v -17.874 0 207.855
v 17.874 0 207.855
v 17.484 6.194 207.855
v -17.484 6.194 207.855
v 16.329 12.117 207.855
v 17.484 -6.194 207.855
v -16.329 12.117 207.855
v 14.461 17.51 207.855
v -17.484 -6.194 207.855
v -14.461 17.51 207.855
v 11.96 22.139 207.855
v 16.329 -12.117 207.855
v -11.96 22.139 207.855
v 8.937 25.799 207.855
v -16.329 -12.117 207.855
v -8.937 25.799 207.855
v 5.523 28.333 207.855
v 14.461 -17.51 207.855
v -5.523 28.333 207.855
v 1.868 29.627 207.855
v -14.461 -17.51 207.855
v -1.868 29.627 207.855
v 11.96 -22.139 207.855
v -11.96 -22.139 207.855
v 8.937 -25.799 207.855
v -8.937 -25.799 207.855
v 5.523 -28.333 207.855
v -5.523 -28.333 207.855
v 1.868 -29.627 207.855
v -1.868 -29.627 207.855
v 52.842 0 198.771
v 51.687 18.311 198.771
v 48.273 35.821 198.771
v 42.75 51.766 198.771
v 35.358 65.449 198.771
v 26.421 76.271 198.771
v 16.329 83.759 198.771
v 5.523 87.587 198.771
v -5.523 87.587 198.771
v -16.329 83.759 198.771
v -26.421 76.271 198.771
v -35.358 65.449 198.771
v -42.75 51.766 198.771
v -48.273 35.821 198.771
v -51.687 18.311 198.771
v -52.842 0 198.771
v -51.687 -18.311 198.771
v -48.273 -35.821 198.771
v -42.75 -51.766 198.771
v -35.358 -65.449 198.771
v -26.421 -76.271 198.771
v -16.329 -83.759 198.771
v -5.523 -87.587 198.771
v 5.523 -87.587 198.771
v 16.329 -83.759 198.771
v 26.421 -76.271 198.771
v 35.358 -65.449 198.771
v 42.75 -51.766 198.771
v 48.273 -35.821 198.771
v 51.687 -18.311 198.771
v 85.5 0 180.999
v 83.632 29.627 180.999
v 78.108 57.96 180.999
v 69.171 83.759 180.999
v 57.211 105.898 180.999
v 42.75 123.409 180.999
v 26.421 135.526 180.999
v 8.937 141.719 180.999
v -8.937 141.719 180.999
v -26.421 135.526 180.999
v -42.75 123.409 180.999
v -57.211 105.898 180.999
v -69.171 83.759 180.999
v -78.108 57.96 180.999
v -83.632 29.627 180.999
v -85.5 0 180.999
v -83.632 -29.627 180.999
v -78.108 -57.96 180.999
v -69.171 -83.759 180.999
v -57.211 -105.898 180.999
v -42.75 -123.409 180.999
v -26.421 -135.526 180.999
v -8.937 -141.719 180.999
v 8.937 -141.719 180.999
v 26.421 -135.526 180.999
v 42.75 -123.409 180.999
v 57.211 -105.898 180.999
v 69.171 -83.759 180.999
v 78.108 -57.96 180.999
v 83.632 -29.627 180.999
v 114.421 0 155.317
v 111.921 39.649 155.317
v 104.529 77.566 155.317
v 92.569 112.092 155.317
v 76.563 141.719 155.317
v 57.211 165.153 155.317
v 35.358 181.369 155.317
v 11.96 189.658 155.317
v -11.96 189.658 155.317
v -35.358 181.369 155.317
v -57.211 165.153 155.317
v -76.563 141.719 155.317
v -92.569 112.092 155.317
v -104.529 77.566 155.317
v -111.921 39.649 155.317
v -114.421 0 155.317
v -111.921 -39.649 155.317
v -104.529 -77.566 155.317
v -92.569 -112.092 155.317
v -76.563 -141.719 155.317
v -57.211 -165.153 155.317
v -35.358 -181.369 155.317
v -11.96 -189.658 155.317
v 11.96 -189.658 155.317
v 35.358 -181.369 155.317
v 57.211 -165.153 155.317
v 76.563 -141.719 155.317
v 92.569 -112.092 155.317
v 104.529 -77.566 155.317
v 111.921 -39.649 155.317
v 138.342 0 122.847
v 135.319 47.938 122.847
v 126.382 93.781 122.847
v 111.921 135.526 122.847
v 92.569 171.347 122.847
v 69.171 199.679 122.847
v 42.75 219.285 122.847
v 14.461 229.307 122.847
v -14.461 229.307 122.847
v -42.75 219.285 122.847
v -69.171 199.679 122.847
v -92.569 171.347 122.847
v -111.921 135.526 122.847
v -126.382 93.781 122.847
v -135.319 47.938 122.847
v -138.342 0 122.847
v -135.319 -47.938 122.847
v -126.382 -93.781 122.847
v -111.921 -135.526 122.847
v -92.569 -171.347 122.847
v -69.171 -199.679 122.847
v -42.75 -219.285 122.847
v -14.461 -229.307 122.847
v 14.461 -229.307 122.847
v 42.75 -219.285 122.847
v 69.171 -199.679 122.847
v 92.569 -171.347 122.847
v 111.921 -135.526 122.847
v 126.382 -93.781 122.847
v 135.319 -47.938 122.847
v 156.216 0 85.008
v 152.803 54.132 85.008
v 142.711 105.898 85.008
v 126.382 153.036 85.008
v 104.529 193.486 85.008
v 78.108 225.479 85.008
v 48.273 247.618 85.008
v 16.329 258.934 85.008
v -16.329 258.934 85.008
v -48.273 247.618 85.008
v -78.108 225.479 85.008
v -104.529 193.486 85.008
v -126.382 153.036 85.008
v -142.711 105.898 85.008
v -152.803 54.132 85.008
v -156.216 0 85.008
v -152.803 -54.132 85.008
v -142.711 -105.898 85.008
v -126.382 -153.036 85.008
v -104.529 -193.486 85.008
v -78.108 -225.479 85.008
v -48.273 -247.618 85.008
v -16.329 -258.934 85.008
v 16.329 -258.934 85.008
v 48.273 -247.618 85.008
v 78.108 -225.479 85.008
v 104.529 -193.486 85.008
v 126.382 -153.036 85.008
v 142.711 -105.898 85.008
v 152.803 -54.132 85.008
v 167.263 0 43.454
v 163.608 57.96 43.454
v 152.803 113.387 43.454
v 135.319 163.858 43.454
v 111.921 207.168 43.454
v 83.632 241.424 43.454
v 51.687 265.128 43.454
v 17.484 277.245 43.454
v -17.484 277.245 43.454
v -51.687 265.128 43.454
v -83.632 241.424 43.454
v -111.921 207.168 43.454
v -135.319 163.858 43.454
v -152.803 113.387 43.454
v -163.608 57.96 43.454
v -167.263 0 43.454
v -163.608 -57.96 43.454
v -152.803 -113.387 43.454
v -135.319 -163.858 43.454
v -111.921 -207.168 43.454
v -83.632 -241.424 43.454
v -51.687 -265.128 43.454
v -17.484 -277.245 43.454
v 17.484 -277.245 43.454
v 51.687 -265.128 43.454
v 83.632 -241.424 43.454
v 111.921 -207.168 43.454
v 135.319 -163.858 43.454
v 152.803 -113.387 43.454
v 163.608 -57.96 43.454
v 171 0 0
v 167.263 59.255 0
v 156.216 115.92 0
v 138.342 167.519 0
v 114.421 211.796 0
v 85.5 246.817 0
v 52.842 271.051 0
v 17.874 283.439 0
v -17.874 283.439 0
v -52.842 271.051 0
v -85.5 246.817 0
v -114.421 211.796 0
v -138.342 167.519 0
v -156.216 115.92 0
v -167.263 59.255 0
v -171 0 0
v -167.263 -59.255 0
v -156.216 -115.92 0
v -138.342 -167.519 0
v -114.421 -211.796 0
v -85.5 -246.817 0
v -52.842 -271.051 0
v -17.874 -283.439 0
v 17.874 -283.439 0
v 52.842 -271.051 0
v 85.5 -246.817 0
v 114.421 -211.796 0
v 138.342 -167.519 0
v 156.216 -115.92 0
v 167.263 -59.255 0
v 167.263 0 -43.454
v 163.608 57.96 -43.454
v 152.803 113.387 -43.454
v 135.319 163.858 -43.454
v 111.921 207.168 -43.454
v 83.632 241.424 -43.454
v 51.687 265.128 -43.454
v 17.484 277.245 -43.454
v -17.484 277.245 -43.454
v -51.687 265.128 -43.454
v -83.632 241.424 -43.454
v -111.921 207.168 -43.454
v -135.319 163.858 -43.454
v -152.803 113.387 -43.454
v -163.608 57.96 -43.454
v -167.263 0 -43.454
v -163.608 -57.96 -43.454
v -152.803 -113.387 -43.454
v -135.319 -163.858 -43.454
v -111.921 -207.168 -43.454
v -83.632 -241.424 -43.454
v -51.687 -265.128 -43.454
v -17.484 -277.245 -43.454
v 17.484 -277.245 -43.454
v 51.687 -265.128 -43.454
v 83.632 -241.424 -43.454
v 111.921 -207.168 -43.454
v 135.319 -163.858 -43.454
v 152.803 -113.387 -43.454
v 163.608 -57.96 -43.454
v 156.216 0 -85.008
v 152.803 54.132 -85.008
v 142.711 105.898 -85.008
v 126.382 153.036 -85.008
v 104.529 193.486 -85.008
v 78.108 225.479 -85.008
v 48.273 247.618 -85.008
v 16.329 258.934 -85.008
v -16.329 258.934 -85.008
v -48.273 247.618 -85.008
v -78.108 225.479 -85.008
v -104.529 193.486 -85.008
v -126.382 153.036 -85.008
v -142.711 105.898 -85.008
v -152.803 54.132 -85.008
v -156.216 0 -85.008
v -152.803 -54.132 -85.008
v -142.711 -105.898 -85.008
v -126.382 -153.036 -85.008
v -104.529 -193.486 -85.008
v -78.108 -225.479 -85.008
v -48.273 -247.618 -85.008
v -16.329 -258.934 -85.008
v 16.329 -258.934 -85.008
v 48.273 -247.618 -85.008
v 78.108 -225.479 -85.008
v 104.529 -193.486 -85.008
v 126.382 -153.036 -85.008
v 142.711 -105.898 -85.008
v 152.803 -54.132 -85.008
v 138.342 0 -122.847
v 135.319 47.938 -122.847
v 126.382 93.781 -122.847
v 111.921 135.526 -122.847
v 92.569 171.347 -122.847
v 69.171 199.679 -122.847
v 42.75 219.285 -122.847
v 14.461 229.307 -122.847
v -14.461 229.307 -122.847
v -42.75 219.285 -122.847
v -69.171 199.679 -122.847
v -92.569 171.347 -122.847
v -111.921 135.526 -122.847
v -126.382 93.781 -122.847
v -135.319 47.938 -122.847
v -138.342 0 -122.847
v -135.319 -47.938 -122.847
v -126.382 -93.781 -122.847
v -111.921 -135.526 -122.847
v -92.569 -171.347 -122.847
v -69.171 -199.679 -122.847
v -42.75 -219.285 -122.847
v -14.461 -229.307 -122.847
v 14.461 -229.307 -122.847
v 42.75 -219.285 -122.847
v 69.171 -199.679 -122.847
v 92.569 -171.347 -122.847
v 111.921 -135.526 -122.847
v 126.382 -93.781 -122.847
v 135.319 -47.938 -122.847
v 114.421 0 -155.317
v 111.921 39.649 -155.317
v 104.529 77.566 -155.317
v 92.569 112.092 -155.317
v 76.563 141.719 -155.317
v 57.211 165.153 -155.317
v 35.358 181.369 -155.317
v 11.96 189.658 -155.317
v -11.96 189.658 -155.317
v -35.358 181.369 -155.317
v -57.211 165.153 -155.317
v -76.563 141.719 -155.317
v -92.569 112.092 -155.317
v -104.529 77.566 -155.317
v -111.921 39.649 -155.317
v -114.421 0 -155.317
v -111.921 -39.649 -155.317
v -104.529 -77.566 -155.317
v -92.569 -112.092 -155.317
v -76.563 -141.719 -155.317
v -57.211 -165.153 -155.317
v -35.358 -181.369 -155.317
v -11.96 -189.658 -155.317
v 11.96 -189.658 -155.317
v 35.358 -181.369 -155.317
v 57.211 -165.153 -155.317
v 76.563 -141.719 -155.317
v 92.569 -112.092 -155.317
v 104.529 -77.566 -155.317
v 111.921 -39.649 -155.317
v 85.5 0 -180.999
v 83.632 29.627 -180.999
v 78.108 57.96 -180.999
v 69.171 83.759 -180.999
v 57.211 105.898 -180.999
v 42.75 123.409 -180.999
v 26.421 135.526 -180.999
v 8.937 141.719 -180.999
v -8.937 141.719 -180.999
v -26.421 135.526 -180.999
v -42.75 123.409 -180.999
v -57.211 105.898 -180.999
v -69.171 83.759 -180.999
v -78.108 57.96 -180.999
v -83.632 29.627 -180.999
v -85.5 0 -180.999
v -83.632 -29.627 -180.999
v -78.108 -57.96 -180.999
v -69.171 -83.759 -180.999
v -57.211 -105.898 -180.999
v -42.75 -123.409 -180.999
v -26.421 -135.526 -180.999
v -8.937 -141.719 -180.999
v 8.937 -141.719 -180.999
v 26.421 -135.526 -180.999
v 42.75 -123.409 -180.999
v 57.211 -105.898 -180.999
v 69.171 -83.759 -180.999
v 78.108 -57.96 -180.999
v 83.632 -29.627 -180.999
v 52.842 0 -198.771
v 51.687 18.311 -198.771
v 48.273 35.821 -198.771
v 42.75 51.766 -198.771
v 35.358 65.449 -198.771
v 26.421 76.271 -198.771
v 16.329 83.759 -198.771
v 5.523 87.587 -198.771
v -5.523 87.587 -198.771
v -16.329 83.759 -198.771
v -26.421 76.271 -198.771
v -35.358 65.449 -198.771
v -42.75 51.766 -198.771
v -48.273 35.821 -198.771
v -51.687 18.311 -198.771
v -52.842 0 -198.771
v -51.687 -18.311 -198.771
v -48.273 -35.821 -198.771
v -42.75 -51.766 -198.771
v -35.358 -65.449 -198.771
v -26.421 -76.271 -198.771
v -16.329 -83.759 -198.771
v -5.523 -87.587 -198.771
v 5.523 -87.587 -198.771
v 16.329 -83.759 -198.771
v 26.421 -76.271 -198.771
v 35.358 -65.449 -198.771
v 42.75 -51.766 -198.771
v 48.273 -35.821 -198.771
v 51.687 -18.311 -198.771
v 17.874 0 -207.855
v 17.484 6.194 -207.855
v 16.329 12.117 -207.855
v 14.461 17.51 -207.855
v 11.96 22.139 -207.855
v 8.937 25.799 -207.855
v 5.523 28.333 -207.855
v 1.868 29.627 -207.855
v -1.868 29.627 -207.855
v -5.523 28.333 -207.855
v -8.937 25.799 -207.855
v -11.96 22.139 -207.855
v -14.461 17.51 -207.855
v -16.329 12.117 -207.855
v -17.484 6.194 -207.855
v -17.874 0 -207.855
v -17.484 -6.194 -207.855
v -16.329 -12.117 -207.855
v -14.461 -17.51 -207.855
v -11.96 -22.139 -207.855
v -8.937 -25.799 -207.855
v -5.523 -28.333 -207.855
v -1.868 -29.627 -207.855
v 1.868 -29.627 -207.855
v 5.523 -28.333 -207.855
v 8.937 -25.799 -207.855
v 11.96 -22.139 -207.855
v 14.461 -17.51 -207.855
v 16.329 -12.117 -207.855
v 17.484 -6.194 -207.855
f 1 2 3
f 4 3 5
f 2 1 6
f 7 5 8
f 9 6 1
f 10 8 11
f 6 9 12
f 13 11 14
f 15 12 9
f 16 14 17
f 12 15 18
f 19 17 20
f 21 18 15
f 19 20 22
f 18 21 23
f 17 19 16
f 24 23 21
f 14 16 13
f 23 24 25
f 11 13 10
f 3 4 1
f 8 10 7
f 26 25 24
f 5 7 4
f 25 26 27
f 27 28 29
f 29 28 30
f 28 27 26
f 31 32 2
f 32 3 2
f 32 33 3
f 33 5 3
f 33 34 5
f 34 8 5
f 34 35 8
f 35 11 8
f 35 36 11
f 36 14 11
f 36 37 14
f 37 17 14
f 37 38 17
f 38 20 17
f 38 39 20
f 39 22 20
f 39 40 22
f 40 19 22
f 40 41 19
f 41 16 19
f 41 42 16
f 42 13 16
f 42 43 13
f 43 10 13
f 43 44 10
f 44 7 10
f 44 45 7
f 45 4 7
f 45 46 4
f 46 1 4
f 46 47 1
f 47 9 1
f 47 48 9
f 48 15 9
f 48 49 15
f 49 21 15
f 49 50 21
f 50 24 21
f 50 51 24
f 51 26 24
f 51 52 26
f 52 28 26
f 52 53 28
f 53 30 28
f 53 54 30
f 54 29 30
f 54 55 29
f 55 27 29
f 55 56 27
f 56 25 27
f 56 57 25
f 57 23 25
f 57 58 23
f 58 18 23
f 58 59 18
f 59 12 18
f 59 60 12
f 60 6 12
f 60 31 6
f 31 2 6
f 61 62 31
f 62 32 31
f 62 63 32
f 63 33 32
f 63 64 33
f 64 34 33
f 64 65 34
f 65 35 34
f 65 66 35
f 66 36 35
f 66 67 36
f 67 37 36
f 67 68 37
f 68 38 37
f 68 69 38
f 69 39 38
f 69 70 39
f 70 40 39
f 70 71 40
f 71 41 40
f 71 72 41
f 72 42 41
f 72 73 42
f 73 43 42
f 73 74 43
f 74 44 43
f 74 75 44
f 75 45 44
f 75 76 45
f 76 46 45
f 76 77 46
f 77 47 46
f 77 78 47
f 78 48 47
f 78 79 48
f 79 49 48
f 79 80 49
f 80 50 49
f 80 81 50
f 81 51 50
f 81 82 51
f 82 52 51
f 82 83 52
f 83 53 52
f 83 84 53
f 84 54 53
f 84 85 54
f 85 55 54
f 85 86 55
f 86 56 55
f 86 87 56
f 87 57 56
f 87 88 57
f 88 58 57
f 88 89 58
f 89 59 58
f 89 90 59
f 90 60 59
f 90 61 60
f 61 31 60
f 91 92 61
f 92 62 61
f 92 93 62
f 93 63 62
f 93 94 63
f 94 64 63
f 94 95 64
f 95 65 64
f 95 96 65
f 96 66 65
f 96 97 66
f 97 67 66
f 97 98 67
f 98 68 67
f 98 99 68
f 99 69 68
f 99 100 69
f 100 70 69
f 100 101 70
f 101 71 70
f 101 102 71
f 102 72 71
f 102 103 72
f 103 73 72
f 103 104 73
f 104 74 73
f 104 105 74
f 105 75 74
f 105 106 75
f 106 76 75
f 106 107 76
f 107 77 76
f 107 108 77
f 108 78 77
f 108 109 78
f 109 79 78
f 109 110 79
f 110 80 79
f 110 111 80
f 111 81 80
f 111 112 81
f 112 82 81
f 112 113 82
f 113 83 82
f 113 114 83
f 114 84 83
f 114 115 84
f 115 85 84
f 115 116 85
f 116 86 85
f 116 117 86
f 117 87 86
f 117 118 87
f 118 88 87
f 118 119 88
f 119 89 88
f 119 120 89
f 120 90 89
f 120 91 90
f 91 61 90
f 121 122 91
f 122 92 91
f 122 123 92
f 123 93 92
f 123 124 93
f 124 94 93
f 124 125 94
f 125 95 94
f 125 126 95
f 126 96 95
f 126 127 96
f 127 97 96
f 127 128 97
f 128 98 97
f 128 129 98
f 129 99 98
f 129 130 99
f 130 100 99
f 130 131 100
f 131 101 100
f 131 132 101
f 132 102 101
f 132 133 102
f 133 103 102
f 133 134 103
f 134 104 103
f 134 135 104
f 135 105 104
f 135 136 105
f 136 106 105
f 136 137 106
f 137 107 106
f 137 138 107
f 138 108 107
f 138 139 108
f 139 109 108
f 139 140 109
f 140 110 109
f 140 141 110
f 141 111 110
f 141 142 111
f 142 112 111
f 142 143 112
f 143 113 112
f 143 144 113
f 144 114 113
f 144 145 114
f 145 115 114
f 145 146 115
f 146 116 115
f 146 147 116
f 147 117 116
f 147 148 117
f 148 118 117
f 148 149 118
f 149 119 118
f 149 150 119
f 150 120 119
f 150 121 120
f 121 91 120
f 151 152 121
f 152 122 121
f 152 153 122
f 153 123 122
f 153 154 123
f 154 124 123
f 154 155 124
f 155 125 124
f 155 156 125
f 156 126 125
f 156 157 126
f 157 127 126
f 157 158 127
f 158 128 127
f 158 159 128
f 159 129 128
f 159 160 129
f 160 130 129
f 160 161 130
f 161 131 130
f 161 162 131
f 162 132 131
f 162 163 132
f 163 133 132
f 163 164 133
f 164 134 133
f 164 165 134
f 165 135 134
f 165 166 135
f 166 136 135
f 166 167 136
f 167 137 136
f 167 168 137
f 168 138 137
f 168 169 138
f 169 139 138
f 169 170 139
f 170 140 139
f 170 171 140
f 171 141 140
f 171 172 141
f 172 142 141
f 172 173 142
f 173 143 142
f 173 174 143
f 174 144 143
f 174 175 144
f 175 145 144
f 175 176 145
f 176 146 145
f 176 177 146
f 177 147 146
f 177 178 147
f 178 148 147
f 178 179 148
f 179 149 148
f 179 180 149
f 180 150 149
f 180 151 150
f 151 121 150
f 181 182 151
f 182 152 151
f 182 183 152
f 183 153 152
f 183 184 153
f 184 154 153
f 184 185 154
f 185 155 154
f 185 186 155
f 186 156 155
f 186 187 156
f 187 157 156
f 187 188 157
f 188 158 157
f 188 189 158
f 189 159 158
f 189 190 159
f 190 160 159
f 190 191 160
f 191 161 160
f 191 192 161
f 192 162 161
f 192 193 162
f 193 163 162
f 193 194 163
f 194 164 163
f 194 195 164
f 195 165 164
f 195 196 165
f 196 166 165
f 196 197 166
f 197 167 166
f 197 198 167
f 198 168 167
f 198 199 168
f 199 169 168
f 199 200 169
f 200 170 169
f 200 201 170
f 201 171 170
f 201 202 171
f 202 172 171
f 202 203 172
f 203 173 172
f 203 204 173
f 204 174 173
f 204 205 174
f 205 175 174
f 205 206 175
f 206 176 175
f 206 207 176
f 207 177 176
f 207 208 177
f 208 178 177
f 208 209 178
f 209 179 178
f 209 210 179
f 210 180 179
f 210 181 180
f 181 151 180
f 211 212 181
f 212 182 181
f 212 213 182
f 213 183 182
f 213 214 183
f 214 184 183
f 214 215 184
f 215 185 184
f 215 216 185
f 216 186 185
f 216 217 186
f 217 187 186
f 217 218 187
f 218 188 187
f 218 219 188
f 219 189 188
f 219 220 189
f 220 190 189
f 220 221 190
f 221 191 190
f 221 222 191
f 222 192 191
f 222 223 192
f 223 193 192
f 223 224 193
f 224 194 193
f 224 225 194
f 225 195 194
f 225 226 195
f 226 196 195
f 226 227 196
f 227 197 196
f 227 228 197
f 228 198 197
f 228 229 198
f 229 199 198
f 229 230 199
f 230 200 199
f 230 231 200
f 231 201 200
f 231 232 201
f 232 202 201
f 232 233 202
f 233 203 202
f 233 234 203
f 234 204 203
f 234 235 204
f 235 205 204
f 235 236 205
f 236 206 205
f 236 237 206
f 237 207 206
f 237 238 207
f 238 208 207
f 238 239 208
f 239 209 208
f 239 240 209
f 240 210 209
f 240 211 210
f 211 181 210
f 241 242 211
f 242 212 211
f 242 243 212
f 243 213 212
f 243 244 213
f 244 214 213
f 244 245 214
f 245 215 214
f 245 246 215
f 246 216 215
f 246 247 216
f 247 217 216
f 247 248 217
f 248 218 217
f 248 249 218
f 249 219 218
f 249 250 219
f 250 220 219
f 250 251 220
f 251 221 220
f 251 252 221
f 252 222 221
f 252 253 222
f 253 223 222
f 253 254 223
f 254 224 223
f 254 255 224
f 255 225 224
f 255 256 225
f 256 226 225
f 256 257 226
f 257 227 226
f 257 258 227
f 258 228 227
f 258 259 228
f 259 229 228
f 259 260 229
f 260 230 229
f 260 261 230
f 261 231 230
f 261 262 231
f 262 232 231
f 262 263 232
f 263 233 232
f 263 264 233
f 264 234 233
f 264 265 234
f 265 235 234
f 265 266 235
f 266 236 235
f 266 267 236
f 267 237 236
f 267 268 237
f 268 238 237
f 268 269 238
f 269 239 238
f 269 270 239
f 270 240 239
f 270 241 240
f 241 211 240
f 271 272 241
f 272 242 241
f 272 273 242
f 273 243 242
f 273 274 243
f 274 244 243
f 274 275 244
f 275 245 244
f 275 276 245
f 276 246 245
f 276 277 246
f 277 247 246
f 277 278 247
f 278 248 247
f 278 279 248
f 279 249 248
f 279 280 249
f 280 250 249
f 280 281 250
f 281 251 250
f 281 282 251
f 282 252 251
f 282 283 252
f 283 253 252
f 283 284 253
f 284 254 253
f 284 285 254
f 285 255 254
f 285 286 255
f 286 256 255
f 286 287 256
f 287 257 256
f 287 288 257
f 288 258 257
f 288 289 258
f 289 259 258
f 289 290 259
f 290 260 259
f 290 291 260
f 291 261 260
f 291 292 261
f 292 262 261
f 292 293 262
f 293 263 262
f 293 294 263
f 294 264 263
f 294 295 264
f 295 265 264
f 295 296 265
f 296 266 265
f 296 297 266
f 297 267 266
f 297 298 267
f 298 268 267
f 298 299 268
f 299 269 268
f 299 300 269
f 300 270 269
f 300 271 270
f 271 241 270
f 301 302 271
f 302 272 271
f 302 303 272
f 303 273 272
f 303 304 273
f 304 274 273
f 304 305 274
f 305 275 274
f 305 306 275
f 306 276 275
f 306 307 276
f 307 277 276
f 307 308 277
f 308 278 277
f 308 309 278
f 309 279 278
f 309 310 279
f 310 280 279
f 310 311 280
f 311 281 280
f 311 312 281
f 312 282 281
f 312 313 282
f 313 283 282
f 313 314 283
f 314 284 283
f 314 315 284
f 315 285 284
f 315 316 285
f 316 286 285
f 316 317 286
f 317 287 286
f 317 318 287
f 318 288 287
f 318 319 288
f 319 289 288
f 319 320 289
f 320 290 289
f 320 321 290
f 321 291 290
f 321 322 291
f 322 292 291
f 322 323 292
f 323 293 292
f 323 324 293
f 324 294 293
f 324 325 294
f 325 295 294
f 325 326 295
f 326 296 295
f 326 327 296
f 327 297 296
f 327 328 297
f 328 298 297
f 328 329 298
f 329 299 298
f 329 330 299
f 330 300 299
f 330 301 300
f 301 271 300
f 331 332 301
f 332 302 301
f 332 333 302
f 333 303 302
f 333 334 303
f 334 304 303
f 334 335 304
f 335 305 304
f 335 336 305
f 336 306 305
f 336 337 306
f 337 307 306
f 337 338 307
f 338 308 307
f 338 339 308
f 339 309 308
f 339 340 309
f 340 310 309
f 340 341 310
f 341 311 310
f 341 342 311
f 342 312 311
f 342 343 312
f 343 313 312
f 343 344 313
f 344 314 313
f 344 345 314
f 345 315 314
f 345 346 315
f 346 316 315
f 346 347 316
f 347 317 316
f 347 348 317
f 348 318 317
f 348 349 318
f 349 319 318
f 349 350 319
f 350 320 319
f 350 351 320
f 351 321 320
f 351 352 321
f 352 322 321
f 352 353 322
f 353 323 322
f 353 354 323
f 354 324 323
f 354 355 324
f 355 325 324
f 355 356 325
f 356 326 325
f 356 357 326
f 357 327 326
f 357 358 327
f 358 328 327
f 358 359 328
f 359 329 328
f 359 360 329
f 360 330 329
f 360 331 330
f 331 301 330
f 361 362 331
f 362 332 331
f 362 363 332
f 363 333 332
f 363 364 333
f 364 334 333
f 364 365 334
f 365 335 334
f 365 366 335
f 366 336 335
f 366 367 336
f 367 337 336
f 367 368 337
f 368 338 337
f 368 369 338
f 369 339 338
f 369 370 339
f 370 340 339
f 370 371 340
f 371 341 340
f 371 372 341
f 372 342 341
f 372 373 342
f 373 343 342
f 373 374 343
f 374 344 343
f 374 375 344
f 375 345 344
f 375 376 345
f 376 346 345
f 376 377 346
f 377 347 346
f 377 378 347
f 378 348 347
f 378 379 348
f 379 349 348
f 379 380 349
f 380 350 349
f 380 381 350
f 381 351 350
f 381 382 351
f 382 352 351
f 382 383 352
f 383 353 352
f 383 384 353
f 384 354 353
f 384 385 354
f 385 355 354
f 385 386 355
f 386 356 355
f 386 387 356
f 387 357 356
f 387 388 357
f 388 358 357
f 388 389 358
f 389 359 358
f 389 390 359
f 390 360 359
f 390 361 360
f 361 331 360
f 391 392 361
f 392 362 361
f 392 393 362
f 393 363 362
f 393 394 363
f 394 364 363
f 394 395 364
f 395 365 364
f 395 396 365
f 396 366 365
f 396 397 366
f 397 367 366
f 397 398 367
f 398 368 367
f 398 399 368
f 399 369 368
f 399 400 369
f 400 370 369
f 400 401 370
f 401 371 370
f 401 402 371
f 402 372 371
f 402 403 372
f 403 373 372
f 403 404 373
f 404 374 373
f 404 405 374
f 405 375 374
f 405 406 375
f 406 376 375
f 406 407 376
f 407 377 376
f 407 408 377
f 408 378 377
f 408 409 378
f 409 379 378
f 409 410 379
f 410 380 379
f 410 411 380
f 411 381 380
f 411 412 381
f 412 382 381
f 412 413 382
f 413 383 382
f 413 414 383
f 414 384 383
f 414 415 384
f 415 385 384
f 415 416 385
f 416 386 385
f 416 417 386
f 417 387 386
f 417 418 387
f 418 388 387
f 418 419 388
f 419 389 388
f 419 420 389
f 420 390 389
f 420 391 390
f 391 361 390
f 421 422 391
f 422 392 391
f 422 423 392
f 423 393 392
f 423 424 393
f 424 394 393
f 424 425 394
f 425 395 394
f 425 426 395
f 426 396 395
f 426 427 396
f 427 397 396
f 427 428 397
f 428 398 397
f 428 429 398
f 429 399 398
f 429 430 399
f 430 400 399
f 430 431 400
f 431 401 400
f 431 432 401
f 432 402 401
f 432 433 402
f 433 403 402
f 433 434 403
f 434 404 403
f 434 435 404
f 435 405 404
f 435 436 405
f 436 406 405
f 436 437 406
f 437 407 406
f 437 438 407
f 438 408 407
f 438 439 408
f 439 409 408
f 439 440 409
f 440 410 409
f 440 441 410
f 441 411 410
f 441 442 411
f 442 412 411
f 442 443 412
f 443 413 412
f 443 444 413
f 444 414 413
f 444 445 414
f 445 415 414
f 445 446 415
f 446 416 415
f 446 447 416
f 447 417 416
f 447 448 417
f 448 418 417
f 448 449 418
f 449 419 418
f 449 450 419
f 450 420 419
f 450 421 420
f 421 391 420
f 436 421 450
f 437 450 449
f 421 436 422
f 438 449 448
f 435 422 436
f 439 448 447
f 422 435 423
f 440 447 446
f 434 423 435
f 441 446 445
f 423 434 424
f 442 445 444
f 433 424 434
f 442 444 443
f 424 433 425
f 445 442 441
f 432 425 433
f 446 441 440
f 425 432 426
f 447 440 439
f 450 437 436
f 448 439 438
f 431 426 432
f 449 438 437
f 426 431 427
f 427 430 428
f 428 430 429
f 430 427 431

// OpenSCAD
// Generated by SolidPython 1.0.1 on 2020-07-29 00:46:49


scale(v = [9, 15, 11]) {
	sphere(r = 19);
}
/***********************************************
*********      SolidPython code:      **********
************************************************
 
# import packages: SolidPython
from solid import *
from solid.utils import *
from itertools import chain, combinations, permutations


class Resize:

    def __init__(self, scad_file):
        self.scad_file = scad_file
        #self.scad_file = import_scad(scad_file)
        # cone/cylinder param:
        self.r1 = 0
        self.r2 = 0
        self.h = 0
        # rectangular prism param:
        self.w = 0
        self.l = 0
        # ellipse param:
        self.r = 0

    # import OpenScad code (file name corresponds to shape)


    # classify shape + parameters
    def assign(self, param1, param2, param3):
        if self.scad_file == 'cone.scad':
            self.r1 = param1
            self.r2 = param2
            self.h = param3
        elif self.scad_file == 'cylinder.scad':
            self.r1 = param1
            self.r2 = param2
            self.h = param3
        elif self.scad_file == 'rectangularPrism.scad':
            self.h = param1
            self.l = param2
            self.w = param3
        else:
            self.r = param1
            self.h = param2

    # resize parameters
    def iterate(self):
        x = range(3, 20, 2)
        i = 1
        if self.scad_file == 'cone.scad':
            tempList = list(permutations(x, 2))
            for temp in tempList:
                param1 = temp[0]
                param2 = temp[1]
                filepath = 'produced_scad_files/' + 'cone' + str(param1) + '_' + str(param2) + '_' + '.scad'
                scad_render_to_file(cylinder(h=param1, r1=param2, r2=0), filepath)

        elif self.scad_file == 'cylinder.scad':
            tempList = list(permutations(x, 3))
            for temp in tempList:
                param1 = temp[0]
                param2 = temp[1]
                filepath = 'produced_scad_files/' + 'cylinder' + str(param1) + '_' + str(param2) + '_' + '.scad'
                scad_render_to_file(cylinder(h=param1, r1=param2, r2=param2), filepath)

        elif self.scad_file == 'rectangularPrism.scad':
            tempList = list(permutations(x, 3))
            for temp in tempList:
                param1 = temp[0]
                param2 = temp[1]
                param3 = temp[2]
                filepath = 'produced_scad_files/' + 'rectangularPrism' + str(param1) + '_' + str(param2) + '_' + str(
                    param3) + '.scad'
                scad_render_to_file(cube(size=(param1, param2, param3)), filepath)

        elif self.scad_file == 'ellipse.scad':
            tempList = list(permutations(x, 4))
            for temp in tempList:
                param1 = temp[0]
                param2 = temp[1]
                param3 = temp[2]
                param4 = temp[3]
                filepath = 'produced_scad_files/' + 'ellipse' + str(param1) + '_' + str(param2) + '_' + str(param3) + '_' + str(param4) + '.scad'
                scad_render_to_file(scale([param1, param2, param3])(sphere(r=param4)), filepath)

    def render_to_scadfile(self):
        scad_render_to_file(scad, 'example.scad') 
 
************************************************/
